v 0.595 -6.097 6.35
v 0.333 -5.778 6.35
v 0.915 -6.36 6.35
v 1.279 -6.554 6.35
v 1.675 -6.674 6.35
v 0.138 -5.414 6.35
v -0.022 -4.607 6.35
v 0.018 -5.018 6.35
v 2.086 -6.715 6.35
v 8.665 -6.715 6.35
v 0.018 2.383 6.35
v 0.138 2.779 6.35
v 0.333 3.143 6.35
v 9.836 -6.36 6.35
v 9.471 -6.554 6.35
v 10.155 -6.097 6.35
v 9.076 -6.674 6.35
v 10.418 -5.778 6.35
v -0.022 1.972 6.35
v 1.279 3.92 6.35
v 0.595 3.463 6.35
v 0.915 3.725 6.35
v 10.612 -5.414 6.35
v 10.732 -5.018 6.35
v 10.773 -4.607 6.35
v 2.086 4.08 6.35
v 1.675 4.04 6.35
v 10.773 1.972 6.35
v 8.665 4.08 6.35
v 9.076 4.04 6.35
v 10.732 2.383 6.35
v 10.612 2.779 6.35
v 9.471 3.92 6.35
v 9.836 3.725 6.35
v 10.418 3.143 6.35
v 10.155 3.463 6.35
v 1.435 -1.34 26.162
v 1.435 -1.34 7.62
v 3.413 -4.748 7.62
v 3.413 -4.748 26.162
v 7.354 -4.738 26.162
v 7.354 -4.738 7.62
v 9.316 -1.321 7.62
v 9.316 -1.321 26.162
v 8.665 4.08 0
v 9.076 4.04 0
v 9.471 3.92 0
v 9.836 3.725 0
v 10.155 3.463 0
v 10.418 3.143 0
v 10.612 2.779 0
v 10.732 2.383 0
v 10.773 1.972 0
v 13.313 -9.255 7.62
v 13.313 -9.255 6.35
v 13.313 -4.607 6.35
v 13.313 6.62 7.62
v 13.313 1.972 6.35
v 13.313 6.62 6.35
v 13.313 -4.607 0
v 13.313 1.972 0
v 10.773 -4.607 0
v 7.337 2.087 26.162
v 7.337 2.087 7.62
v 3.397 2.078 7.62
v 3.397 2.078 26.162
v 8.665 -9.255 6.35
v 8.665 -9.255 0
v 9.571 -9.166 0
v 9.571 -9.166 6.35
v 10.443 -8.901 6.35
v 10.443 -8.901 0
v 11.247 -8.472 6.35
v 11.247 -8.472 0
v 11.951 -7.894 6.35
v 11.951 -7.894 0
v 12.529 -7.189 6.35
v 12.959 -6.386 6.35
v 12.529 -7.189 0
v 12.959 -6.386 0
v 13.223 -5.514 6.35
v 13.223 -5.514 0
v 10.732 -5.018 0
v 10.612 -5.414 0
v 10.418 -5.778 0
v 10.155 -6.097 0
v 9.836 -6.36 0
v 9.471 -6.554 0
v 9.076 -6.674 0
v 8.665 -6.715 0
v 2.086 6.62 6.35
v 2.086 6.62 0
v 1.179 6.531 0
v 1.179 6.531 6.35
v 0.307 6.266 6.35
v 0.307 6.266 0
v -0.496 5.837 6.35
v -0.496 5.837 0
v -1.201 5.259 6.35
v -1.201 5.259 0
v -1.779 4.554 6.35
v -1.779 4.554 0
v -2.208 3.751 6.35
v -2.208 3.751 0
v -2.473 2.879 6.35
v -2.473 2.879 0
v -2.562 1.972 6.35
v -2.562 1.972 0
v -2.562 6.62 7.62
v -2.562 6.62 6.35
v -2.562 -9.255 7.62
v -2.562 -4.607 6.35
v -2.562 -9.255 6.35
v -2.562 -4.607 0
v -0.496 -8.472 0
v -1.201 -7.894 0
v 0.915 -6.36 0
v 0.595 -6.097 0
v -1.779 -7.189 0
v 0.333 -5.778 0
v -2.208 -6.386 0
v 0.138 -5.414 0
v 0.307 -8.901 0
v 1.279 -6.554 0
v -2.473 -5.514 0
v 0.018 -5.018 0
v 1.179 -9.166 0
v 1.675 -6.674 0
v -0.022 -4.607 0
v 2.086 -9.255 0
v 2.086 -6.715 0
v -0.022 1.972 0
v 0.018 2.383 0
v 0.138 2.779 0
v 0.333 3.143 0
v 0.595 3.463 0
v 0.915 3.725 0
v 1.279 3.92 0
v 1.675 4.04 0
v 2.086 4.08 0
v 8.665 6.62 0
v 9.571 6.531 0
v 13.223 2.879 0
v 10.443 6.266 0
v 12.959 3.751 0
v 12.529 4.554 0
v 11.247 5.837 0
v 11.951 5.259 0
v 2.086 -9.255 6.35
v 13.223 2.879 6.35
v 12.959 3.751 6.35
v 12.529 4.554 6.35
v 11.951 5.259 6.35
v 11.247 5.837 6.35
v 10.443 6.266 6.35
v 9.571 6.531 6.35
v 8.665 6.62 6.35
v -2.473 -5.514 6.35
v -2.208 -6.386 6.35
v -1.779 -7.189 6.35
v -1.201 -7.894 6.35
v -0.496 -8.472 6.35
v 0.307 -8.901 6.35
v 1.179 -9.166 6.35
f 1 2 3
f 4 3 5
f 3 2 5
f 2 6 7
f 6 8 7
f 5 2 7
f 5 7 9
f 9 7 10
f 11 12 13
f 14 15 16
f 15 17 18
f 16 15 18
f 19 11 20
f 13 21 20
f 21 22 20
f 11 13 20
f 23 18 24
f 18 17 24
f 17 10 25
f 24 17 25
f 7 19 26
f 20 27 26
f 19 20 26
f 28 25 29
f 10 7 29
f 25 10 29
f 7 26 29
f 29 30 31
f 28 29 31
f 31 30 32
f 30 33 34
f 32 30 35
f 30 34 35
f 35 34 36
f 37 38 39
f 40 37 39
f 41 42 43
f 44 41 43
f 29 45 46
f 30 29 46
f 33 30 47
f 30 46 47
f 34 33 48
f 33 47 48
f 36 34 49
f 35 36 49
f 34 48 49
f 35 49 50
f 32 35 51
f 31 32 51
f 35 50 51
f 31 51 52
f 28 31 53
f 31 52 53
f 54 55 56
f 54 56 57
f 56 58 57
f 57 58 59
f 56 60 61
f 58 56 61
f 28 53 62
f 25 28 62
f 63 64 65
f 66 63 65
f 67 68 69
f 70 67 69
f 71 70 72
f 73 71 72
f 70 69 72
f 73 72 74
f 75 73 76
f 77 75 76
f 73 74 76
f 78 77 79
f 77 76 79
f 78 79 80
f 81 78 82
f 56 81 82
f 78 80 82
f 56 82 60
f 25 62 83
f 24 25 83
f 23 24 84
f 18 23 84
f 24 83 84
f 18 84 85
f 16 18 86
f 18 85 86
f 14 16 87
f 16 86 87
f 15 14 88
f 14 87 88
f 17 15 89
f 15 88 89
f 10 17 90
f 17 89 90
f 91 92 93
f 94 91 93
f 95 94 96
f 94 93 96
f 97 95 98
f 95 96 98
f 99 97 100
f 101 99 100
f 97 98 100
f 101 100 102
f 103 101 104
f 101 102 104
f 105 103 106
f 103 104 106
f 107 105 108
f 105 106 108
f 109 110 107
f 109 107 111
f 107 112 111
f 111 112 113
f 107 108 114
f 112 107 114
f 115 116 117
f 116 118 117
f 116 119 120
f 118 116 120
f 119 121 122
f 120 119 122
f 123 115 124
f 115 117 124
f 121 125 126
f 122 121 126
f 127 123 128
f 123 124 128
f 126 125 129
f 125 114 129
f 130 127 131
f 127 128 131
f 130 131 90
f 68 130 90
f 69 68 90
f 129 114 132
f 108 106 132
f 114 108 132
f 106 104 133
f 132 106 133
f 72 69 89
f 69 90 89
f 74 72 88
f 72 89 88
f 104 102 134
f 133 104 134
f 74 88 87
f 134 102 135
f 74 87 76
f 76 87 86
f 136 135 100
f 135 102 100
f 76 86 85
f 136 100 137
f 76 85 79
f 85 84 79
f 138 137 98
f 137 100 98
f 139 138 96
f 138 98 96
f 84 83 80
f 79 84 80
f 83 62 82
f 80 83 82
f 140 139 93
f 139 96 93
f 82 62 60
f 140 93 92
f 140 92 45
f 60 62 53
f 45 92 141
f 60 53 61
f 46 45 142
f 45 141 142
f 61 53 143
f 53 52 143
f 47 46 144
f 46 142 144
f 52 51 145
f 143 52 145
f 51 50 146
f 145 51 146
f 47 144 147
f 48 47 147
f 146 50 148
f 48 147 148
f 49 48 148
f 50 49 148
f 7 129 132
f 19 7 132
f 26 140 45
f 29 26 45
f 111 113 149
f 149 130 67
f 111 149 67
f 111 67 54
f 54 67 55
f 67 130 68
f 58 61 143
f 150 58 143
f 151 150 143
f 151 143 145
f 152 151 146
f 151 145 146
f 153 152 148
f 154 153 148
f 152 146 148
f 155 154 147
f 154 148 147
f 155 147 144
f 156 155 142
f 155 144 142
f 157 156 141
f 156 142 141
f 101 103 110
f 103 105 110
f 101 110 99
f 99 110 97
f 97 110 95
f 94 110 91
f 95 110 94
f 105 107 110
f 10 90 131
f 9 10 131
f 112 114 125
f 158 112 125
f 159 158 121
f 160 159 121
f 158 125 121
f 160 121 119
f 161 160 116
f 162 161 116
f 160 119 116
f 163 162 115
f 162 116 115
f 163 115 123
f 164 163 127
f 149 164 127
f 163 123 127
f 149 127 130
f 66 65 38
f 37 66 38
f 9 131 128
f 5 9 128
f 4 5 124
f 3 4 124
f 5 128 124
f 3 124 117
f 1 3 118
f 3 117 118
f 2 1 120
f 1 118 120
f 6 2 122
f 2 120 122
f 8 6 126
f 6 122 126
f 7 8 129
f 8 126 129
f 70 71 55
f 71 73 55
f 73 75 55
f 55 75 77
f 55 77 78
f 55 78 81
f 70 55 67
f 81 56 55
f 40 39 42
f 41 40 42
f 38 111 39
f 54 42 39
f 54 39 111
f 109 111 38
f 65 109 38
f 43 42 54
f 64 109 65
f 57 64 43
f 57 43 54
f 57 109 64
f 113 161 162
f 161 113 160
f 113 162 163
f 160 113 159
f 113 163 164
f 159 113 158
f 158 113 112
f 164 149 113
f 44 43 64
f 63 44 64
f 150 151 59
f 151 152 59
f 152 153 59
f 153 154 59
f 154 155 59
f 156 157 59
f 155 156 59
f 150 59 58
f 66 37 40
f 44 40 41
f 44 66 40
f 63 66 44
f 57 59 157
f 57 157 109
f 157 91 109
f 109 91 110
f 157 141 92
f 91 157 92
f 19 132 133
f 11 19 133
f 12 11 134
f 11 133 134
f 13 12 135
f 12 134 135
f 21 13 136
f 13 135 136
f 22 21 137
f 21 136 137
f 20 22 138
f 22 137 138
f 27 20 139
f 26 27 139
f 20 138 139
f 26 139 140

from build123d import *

# Parameters (mm, degrees)
F1_DEPTH = 6.35
F3_DEPTH = 1.27
F5_DEPTH = 18.542


with BuildPart() as f1:
    # F0 (on Top) → F1 (new body)
    with BuildSketch(Plane.XY):
        with BuildLine():
            Line((8.6645979291, 6.620054795), (2.0859979291, 6.620054795))
            ThreePointArc((2.0859979291, 6.620054795), (-1.2007758112, 5.2586285353), (-2.5622020709, 1.971854795))
            Line((-2.5622020709, 1.971854795), (-2.5622020709, -4.606745205))
            ThreePointArc((-2.5622020709, -4.606745205), (-1.2007758112, -7.8935189453), (2.0859979291, -9.254945205))
            Line((2.0859979291, -9.254945205), (8.6645979291, -9.254945205))
            ThreePointArc((8.6645979291, -9.254945205), (11.9513716694, -7.8935189453), (13.3127979291, -4.606745205))
            Line((13.3127979291, -4.606745205), (13.3127979291, 1.971854795))
            ThreePointArc((13.3127979291, 1.971854795), (11.9513716694, 5.2586285353), (8.6645979291, 6.620054795))
        make_face()
        with BuildLine():
            ThreePointArc((-0.0222020709, 1.971854795), (0.595275413, 3.4625773111), (2.0859979291, 4.080054795))
            Line((2.0859979291, 4.080054795), (8.6645979291, 4.080054795))
            ThreePointArc((8.6645979291, 4.080054795), (10.1553204452, 3.4625773111), (10.7727979291, 1.971854795))
            Line((10.7727979291, 1.971854795), (10.7727979291, -4.606745205))
            ThreePointArc((10.7727979291, -4.606745205), (10.1553204452, -6.0974677211), (8.6645979291, -6.714945205))
            Line((8.6645979291, -6.714945205), (2.0859979291, -6.714945205))
            ThreePointArc((2.0859979291, -6.714945205), (0.595275413, -6.0974677211), (-0.0222020709, -4.606745205))
            Line((-0.0222020709, -4.606745205), (-0.0222020709, 1.971854795))
        make_face(mode=Mode.SUBTRACT)
    extrude(amount=F1_DEPTH)

    # F2 (on face) → F3 (join)
    with BuildSketch(Plane.XY.offset(6.35)):
        with BuildLine():
            Line((8.6645979291, 6.620054795), (2.0859979291, 6.620054795))
            ThreePointArc((2.0859979291, 6.620054795), (-1.2007758112, 5.2586285353), (-2.5622020709, 1.971854795))
            Line((-2.5622020709, 1.971854795), (-2.5622020709, -4.606745205))
            ThreePointArc((-2.5622020709, -4.606745205), (-1.2007758112, -7.8935189453), (2.0859979291, -9.254945205))
            Line((2.0859979291, -9.254945205), (8.6645979291, -9.254945205))
            ThreePointArc((8.6645979291, -9.254945205), (11.9513716694, -7.8935189453), (13.3127979291, -4.606745205))
            Line((13.3127979291, -4.606745205), (13.3127979291, 1.971854795))
            ThreePointArc((13.3127979291, 1.971854795), (11.9513716694, 5.2586285353), (8.6645979291, 6.620054795))
        make_face()
        with BuildLine():
            Line((-0.0222020709, -4.606745205), (-0.0222020709, 1.971854795))
            ThreePointArc((-0.0222020709, 1.971854795), (0.595275413, 3.4625773111), (2.0859979291, 4.080054795))
            Line((2.0859979291, 4.080054795), (8.6645979291, 4.080054795))
            ThreePointArc((8.6645979291, 4.080054795), (10.1553204452, 3.4625773111), (10.7727979291, 1.971854795))
            Line((10.7727979291, 1.971854795), (10.7727979291, -4.606745205))
            ThreePointArc((10.7727979291, -4.606745205), (10.1553204452, -6.0974677211), (8.6645979291, -6.714945205))
            Line((8.6645979291, -6.714945205), (2.0859979291, -6.714945205))
            ThreePointArc((2.0859979291, -6.714945205), (0.595275413, -6.0974677211), (-0.0222020709, -4.606745205))
        make_face(mode=Mode.SUBTRACT)
        with BuildLine():
            ThreePointArc((2.0859979291, 4.080054795), (0.595275413, 3.4625773111), (-0.0222020709, 1.971854795))
            Line((-0.0222020709, 1.971854795), (-0.0222020709, -4.606745205))
            ThreePointArc((-0.0222020709, -4.606745205), (0.595275413, -6.0974677211), (2.0859979291, -6.714945205))
            Line((2.0859979291, -6.714945205), (8.6645979291, -6.714945205))
            ThreePointArc((8.6645979291, -6.714945205), (10.1553204452, -6.0974677211), (10.7727979291, -4.606745205))
            Line((10.7727979291, -4.606745205), (10.7727979291, 1.971854795))
            ThreePointArc((10.7727979291, 1.971854795), (10.1553204452, 3.4625773111), (8.6645979291, 4.080054795))
            Line((8.6645979291, 4.080054795), (2.0859979291, 4.080054795))
        make_face()
        with BuildLine():
            Line((2.0859979291, 6.620054795), (-2.5622020709, 6.620054795))
            Line((-2.5622020709, 6.620054795), (-2.5622020709, 1.971854795))
            ThreePointArc((-2.5622020709, 1.971854795), (-1.2007758112, 5.2586285353), (2.0859979291, 6.620054795))
        make_face()
        with BuildLine():
            ThreePointArc((2.0859979291, -9.254945205), (-1.2007758112, -7.8935189453), (-2.5622020709, -4.606745205))
            Line((-2.5622020709, -4.606745205), (-2.5622020709, -9.254945205))
            Line((-2.5622020709, -9.254945205), (2.0859979291, -9.254945205))
        make_face()
        with BuildLine():
            Line((13.3127979291, -9.254945205), (13.3127979291, -4.606745205))
            ThreePointArc((13.3127979291, -4.606745205), (11.9513716694, -7.8935189453), (8.6645979291, -9.254945205))
            Line((8.6645979291, -9.254945205), (13.3127979291, -9.254945205))
        make_face()
        with BuildLine():
            Line((13.3127979291, 6.620054795), (8.6645979291, 6.620054795))
            ThreePointArc((8.6645979291, 6.620054795), (11.9513716694, 5.2586285353), (13.3127979291, 1.971854795))
            Line((13.3127979291, 1.971854795), (13.3127979291, 6.620054795))
        make_face()
    extrude(amount=F3_DEPTH)

    # F4 (on face) → F5 (join)
    with BuildSketch(Plane.XY.offset(7.62)):
        Polygon((3.3965749548, 2.0775151044), (1.4346468435, -1.3400371025), (3.4133698178, -4.7478927907), (7.3540209034, -4.7381962721), (9.3159490147, -1.3206440652), (7.3372260404, 2.0872116231), align=None)
    extrude(amount=F5_DEPTH)


solid = f1.part
